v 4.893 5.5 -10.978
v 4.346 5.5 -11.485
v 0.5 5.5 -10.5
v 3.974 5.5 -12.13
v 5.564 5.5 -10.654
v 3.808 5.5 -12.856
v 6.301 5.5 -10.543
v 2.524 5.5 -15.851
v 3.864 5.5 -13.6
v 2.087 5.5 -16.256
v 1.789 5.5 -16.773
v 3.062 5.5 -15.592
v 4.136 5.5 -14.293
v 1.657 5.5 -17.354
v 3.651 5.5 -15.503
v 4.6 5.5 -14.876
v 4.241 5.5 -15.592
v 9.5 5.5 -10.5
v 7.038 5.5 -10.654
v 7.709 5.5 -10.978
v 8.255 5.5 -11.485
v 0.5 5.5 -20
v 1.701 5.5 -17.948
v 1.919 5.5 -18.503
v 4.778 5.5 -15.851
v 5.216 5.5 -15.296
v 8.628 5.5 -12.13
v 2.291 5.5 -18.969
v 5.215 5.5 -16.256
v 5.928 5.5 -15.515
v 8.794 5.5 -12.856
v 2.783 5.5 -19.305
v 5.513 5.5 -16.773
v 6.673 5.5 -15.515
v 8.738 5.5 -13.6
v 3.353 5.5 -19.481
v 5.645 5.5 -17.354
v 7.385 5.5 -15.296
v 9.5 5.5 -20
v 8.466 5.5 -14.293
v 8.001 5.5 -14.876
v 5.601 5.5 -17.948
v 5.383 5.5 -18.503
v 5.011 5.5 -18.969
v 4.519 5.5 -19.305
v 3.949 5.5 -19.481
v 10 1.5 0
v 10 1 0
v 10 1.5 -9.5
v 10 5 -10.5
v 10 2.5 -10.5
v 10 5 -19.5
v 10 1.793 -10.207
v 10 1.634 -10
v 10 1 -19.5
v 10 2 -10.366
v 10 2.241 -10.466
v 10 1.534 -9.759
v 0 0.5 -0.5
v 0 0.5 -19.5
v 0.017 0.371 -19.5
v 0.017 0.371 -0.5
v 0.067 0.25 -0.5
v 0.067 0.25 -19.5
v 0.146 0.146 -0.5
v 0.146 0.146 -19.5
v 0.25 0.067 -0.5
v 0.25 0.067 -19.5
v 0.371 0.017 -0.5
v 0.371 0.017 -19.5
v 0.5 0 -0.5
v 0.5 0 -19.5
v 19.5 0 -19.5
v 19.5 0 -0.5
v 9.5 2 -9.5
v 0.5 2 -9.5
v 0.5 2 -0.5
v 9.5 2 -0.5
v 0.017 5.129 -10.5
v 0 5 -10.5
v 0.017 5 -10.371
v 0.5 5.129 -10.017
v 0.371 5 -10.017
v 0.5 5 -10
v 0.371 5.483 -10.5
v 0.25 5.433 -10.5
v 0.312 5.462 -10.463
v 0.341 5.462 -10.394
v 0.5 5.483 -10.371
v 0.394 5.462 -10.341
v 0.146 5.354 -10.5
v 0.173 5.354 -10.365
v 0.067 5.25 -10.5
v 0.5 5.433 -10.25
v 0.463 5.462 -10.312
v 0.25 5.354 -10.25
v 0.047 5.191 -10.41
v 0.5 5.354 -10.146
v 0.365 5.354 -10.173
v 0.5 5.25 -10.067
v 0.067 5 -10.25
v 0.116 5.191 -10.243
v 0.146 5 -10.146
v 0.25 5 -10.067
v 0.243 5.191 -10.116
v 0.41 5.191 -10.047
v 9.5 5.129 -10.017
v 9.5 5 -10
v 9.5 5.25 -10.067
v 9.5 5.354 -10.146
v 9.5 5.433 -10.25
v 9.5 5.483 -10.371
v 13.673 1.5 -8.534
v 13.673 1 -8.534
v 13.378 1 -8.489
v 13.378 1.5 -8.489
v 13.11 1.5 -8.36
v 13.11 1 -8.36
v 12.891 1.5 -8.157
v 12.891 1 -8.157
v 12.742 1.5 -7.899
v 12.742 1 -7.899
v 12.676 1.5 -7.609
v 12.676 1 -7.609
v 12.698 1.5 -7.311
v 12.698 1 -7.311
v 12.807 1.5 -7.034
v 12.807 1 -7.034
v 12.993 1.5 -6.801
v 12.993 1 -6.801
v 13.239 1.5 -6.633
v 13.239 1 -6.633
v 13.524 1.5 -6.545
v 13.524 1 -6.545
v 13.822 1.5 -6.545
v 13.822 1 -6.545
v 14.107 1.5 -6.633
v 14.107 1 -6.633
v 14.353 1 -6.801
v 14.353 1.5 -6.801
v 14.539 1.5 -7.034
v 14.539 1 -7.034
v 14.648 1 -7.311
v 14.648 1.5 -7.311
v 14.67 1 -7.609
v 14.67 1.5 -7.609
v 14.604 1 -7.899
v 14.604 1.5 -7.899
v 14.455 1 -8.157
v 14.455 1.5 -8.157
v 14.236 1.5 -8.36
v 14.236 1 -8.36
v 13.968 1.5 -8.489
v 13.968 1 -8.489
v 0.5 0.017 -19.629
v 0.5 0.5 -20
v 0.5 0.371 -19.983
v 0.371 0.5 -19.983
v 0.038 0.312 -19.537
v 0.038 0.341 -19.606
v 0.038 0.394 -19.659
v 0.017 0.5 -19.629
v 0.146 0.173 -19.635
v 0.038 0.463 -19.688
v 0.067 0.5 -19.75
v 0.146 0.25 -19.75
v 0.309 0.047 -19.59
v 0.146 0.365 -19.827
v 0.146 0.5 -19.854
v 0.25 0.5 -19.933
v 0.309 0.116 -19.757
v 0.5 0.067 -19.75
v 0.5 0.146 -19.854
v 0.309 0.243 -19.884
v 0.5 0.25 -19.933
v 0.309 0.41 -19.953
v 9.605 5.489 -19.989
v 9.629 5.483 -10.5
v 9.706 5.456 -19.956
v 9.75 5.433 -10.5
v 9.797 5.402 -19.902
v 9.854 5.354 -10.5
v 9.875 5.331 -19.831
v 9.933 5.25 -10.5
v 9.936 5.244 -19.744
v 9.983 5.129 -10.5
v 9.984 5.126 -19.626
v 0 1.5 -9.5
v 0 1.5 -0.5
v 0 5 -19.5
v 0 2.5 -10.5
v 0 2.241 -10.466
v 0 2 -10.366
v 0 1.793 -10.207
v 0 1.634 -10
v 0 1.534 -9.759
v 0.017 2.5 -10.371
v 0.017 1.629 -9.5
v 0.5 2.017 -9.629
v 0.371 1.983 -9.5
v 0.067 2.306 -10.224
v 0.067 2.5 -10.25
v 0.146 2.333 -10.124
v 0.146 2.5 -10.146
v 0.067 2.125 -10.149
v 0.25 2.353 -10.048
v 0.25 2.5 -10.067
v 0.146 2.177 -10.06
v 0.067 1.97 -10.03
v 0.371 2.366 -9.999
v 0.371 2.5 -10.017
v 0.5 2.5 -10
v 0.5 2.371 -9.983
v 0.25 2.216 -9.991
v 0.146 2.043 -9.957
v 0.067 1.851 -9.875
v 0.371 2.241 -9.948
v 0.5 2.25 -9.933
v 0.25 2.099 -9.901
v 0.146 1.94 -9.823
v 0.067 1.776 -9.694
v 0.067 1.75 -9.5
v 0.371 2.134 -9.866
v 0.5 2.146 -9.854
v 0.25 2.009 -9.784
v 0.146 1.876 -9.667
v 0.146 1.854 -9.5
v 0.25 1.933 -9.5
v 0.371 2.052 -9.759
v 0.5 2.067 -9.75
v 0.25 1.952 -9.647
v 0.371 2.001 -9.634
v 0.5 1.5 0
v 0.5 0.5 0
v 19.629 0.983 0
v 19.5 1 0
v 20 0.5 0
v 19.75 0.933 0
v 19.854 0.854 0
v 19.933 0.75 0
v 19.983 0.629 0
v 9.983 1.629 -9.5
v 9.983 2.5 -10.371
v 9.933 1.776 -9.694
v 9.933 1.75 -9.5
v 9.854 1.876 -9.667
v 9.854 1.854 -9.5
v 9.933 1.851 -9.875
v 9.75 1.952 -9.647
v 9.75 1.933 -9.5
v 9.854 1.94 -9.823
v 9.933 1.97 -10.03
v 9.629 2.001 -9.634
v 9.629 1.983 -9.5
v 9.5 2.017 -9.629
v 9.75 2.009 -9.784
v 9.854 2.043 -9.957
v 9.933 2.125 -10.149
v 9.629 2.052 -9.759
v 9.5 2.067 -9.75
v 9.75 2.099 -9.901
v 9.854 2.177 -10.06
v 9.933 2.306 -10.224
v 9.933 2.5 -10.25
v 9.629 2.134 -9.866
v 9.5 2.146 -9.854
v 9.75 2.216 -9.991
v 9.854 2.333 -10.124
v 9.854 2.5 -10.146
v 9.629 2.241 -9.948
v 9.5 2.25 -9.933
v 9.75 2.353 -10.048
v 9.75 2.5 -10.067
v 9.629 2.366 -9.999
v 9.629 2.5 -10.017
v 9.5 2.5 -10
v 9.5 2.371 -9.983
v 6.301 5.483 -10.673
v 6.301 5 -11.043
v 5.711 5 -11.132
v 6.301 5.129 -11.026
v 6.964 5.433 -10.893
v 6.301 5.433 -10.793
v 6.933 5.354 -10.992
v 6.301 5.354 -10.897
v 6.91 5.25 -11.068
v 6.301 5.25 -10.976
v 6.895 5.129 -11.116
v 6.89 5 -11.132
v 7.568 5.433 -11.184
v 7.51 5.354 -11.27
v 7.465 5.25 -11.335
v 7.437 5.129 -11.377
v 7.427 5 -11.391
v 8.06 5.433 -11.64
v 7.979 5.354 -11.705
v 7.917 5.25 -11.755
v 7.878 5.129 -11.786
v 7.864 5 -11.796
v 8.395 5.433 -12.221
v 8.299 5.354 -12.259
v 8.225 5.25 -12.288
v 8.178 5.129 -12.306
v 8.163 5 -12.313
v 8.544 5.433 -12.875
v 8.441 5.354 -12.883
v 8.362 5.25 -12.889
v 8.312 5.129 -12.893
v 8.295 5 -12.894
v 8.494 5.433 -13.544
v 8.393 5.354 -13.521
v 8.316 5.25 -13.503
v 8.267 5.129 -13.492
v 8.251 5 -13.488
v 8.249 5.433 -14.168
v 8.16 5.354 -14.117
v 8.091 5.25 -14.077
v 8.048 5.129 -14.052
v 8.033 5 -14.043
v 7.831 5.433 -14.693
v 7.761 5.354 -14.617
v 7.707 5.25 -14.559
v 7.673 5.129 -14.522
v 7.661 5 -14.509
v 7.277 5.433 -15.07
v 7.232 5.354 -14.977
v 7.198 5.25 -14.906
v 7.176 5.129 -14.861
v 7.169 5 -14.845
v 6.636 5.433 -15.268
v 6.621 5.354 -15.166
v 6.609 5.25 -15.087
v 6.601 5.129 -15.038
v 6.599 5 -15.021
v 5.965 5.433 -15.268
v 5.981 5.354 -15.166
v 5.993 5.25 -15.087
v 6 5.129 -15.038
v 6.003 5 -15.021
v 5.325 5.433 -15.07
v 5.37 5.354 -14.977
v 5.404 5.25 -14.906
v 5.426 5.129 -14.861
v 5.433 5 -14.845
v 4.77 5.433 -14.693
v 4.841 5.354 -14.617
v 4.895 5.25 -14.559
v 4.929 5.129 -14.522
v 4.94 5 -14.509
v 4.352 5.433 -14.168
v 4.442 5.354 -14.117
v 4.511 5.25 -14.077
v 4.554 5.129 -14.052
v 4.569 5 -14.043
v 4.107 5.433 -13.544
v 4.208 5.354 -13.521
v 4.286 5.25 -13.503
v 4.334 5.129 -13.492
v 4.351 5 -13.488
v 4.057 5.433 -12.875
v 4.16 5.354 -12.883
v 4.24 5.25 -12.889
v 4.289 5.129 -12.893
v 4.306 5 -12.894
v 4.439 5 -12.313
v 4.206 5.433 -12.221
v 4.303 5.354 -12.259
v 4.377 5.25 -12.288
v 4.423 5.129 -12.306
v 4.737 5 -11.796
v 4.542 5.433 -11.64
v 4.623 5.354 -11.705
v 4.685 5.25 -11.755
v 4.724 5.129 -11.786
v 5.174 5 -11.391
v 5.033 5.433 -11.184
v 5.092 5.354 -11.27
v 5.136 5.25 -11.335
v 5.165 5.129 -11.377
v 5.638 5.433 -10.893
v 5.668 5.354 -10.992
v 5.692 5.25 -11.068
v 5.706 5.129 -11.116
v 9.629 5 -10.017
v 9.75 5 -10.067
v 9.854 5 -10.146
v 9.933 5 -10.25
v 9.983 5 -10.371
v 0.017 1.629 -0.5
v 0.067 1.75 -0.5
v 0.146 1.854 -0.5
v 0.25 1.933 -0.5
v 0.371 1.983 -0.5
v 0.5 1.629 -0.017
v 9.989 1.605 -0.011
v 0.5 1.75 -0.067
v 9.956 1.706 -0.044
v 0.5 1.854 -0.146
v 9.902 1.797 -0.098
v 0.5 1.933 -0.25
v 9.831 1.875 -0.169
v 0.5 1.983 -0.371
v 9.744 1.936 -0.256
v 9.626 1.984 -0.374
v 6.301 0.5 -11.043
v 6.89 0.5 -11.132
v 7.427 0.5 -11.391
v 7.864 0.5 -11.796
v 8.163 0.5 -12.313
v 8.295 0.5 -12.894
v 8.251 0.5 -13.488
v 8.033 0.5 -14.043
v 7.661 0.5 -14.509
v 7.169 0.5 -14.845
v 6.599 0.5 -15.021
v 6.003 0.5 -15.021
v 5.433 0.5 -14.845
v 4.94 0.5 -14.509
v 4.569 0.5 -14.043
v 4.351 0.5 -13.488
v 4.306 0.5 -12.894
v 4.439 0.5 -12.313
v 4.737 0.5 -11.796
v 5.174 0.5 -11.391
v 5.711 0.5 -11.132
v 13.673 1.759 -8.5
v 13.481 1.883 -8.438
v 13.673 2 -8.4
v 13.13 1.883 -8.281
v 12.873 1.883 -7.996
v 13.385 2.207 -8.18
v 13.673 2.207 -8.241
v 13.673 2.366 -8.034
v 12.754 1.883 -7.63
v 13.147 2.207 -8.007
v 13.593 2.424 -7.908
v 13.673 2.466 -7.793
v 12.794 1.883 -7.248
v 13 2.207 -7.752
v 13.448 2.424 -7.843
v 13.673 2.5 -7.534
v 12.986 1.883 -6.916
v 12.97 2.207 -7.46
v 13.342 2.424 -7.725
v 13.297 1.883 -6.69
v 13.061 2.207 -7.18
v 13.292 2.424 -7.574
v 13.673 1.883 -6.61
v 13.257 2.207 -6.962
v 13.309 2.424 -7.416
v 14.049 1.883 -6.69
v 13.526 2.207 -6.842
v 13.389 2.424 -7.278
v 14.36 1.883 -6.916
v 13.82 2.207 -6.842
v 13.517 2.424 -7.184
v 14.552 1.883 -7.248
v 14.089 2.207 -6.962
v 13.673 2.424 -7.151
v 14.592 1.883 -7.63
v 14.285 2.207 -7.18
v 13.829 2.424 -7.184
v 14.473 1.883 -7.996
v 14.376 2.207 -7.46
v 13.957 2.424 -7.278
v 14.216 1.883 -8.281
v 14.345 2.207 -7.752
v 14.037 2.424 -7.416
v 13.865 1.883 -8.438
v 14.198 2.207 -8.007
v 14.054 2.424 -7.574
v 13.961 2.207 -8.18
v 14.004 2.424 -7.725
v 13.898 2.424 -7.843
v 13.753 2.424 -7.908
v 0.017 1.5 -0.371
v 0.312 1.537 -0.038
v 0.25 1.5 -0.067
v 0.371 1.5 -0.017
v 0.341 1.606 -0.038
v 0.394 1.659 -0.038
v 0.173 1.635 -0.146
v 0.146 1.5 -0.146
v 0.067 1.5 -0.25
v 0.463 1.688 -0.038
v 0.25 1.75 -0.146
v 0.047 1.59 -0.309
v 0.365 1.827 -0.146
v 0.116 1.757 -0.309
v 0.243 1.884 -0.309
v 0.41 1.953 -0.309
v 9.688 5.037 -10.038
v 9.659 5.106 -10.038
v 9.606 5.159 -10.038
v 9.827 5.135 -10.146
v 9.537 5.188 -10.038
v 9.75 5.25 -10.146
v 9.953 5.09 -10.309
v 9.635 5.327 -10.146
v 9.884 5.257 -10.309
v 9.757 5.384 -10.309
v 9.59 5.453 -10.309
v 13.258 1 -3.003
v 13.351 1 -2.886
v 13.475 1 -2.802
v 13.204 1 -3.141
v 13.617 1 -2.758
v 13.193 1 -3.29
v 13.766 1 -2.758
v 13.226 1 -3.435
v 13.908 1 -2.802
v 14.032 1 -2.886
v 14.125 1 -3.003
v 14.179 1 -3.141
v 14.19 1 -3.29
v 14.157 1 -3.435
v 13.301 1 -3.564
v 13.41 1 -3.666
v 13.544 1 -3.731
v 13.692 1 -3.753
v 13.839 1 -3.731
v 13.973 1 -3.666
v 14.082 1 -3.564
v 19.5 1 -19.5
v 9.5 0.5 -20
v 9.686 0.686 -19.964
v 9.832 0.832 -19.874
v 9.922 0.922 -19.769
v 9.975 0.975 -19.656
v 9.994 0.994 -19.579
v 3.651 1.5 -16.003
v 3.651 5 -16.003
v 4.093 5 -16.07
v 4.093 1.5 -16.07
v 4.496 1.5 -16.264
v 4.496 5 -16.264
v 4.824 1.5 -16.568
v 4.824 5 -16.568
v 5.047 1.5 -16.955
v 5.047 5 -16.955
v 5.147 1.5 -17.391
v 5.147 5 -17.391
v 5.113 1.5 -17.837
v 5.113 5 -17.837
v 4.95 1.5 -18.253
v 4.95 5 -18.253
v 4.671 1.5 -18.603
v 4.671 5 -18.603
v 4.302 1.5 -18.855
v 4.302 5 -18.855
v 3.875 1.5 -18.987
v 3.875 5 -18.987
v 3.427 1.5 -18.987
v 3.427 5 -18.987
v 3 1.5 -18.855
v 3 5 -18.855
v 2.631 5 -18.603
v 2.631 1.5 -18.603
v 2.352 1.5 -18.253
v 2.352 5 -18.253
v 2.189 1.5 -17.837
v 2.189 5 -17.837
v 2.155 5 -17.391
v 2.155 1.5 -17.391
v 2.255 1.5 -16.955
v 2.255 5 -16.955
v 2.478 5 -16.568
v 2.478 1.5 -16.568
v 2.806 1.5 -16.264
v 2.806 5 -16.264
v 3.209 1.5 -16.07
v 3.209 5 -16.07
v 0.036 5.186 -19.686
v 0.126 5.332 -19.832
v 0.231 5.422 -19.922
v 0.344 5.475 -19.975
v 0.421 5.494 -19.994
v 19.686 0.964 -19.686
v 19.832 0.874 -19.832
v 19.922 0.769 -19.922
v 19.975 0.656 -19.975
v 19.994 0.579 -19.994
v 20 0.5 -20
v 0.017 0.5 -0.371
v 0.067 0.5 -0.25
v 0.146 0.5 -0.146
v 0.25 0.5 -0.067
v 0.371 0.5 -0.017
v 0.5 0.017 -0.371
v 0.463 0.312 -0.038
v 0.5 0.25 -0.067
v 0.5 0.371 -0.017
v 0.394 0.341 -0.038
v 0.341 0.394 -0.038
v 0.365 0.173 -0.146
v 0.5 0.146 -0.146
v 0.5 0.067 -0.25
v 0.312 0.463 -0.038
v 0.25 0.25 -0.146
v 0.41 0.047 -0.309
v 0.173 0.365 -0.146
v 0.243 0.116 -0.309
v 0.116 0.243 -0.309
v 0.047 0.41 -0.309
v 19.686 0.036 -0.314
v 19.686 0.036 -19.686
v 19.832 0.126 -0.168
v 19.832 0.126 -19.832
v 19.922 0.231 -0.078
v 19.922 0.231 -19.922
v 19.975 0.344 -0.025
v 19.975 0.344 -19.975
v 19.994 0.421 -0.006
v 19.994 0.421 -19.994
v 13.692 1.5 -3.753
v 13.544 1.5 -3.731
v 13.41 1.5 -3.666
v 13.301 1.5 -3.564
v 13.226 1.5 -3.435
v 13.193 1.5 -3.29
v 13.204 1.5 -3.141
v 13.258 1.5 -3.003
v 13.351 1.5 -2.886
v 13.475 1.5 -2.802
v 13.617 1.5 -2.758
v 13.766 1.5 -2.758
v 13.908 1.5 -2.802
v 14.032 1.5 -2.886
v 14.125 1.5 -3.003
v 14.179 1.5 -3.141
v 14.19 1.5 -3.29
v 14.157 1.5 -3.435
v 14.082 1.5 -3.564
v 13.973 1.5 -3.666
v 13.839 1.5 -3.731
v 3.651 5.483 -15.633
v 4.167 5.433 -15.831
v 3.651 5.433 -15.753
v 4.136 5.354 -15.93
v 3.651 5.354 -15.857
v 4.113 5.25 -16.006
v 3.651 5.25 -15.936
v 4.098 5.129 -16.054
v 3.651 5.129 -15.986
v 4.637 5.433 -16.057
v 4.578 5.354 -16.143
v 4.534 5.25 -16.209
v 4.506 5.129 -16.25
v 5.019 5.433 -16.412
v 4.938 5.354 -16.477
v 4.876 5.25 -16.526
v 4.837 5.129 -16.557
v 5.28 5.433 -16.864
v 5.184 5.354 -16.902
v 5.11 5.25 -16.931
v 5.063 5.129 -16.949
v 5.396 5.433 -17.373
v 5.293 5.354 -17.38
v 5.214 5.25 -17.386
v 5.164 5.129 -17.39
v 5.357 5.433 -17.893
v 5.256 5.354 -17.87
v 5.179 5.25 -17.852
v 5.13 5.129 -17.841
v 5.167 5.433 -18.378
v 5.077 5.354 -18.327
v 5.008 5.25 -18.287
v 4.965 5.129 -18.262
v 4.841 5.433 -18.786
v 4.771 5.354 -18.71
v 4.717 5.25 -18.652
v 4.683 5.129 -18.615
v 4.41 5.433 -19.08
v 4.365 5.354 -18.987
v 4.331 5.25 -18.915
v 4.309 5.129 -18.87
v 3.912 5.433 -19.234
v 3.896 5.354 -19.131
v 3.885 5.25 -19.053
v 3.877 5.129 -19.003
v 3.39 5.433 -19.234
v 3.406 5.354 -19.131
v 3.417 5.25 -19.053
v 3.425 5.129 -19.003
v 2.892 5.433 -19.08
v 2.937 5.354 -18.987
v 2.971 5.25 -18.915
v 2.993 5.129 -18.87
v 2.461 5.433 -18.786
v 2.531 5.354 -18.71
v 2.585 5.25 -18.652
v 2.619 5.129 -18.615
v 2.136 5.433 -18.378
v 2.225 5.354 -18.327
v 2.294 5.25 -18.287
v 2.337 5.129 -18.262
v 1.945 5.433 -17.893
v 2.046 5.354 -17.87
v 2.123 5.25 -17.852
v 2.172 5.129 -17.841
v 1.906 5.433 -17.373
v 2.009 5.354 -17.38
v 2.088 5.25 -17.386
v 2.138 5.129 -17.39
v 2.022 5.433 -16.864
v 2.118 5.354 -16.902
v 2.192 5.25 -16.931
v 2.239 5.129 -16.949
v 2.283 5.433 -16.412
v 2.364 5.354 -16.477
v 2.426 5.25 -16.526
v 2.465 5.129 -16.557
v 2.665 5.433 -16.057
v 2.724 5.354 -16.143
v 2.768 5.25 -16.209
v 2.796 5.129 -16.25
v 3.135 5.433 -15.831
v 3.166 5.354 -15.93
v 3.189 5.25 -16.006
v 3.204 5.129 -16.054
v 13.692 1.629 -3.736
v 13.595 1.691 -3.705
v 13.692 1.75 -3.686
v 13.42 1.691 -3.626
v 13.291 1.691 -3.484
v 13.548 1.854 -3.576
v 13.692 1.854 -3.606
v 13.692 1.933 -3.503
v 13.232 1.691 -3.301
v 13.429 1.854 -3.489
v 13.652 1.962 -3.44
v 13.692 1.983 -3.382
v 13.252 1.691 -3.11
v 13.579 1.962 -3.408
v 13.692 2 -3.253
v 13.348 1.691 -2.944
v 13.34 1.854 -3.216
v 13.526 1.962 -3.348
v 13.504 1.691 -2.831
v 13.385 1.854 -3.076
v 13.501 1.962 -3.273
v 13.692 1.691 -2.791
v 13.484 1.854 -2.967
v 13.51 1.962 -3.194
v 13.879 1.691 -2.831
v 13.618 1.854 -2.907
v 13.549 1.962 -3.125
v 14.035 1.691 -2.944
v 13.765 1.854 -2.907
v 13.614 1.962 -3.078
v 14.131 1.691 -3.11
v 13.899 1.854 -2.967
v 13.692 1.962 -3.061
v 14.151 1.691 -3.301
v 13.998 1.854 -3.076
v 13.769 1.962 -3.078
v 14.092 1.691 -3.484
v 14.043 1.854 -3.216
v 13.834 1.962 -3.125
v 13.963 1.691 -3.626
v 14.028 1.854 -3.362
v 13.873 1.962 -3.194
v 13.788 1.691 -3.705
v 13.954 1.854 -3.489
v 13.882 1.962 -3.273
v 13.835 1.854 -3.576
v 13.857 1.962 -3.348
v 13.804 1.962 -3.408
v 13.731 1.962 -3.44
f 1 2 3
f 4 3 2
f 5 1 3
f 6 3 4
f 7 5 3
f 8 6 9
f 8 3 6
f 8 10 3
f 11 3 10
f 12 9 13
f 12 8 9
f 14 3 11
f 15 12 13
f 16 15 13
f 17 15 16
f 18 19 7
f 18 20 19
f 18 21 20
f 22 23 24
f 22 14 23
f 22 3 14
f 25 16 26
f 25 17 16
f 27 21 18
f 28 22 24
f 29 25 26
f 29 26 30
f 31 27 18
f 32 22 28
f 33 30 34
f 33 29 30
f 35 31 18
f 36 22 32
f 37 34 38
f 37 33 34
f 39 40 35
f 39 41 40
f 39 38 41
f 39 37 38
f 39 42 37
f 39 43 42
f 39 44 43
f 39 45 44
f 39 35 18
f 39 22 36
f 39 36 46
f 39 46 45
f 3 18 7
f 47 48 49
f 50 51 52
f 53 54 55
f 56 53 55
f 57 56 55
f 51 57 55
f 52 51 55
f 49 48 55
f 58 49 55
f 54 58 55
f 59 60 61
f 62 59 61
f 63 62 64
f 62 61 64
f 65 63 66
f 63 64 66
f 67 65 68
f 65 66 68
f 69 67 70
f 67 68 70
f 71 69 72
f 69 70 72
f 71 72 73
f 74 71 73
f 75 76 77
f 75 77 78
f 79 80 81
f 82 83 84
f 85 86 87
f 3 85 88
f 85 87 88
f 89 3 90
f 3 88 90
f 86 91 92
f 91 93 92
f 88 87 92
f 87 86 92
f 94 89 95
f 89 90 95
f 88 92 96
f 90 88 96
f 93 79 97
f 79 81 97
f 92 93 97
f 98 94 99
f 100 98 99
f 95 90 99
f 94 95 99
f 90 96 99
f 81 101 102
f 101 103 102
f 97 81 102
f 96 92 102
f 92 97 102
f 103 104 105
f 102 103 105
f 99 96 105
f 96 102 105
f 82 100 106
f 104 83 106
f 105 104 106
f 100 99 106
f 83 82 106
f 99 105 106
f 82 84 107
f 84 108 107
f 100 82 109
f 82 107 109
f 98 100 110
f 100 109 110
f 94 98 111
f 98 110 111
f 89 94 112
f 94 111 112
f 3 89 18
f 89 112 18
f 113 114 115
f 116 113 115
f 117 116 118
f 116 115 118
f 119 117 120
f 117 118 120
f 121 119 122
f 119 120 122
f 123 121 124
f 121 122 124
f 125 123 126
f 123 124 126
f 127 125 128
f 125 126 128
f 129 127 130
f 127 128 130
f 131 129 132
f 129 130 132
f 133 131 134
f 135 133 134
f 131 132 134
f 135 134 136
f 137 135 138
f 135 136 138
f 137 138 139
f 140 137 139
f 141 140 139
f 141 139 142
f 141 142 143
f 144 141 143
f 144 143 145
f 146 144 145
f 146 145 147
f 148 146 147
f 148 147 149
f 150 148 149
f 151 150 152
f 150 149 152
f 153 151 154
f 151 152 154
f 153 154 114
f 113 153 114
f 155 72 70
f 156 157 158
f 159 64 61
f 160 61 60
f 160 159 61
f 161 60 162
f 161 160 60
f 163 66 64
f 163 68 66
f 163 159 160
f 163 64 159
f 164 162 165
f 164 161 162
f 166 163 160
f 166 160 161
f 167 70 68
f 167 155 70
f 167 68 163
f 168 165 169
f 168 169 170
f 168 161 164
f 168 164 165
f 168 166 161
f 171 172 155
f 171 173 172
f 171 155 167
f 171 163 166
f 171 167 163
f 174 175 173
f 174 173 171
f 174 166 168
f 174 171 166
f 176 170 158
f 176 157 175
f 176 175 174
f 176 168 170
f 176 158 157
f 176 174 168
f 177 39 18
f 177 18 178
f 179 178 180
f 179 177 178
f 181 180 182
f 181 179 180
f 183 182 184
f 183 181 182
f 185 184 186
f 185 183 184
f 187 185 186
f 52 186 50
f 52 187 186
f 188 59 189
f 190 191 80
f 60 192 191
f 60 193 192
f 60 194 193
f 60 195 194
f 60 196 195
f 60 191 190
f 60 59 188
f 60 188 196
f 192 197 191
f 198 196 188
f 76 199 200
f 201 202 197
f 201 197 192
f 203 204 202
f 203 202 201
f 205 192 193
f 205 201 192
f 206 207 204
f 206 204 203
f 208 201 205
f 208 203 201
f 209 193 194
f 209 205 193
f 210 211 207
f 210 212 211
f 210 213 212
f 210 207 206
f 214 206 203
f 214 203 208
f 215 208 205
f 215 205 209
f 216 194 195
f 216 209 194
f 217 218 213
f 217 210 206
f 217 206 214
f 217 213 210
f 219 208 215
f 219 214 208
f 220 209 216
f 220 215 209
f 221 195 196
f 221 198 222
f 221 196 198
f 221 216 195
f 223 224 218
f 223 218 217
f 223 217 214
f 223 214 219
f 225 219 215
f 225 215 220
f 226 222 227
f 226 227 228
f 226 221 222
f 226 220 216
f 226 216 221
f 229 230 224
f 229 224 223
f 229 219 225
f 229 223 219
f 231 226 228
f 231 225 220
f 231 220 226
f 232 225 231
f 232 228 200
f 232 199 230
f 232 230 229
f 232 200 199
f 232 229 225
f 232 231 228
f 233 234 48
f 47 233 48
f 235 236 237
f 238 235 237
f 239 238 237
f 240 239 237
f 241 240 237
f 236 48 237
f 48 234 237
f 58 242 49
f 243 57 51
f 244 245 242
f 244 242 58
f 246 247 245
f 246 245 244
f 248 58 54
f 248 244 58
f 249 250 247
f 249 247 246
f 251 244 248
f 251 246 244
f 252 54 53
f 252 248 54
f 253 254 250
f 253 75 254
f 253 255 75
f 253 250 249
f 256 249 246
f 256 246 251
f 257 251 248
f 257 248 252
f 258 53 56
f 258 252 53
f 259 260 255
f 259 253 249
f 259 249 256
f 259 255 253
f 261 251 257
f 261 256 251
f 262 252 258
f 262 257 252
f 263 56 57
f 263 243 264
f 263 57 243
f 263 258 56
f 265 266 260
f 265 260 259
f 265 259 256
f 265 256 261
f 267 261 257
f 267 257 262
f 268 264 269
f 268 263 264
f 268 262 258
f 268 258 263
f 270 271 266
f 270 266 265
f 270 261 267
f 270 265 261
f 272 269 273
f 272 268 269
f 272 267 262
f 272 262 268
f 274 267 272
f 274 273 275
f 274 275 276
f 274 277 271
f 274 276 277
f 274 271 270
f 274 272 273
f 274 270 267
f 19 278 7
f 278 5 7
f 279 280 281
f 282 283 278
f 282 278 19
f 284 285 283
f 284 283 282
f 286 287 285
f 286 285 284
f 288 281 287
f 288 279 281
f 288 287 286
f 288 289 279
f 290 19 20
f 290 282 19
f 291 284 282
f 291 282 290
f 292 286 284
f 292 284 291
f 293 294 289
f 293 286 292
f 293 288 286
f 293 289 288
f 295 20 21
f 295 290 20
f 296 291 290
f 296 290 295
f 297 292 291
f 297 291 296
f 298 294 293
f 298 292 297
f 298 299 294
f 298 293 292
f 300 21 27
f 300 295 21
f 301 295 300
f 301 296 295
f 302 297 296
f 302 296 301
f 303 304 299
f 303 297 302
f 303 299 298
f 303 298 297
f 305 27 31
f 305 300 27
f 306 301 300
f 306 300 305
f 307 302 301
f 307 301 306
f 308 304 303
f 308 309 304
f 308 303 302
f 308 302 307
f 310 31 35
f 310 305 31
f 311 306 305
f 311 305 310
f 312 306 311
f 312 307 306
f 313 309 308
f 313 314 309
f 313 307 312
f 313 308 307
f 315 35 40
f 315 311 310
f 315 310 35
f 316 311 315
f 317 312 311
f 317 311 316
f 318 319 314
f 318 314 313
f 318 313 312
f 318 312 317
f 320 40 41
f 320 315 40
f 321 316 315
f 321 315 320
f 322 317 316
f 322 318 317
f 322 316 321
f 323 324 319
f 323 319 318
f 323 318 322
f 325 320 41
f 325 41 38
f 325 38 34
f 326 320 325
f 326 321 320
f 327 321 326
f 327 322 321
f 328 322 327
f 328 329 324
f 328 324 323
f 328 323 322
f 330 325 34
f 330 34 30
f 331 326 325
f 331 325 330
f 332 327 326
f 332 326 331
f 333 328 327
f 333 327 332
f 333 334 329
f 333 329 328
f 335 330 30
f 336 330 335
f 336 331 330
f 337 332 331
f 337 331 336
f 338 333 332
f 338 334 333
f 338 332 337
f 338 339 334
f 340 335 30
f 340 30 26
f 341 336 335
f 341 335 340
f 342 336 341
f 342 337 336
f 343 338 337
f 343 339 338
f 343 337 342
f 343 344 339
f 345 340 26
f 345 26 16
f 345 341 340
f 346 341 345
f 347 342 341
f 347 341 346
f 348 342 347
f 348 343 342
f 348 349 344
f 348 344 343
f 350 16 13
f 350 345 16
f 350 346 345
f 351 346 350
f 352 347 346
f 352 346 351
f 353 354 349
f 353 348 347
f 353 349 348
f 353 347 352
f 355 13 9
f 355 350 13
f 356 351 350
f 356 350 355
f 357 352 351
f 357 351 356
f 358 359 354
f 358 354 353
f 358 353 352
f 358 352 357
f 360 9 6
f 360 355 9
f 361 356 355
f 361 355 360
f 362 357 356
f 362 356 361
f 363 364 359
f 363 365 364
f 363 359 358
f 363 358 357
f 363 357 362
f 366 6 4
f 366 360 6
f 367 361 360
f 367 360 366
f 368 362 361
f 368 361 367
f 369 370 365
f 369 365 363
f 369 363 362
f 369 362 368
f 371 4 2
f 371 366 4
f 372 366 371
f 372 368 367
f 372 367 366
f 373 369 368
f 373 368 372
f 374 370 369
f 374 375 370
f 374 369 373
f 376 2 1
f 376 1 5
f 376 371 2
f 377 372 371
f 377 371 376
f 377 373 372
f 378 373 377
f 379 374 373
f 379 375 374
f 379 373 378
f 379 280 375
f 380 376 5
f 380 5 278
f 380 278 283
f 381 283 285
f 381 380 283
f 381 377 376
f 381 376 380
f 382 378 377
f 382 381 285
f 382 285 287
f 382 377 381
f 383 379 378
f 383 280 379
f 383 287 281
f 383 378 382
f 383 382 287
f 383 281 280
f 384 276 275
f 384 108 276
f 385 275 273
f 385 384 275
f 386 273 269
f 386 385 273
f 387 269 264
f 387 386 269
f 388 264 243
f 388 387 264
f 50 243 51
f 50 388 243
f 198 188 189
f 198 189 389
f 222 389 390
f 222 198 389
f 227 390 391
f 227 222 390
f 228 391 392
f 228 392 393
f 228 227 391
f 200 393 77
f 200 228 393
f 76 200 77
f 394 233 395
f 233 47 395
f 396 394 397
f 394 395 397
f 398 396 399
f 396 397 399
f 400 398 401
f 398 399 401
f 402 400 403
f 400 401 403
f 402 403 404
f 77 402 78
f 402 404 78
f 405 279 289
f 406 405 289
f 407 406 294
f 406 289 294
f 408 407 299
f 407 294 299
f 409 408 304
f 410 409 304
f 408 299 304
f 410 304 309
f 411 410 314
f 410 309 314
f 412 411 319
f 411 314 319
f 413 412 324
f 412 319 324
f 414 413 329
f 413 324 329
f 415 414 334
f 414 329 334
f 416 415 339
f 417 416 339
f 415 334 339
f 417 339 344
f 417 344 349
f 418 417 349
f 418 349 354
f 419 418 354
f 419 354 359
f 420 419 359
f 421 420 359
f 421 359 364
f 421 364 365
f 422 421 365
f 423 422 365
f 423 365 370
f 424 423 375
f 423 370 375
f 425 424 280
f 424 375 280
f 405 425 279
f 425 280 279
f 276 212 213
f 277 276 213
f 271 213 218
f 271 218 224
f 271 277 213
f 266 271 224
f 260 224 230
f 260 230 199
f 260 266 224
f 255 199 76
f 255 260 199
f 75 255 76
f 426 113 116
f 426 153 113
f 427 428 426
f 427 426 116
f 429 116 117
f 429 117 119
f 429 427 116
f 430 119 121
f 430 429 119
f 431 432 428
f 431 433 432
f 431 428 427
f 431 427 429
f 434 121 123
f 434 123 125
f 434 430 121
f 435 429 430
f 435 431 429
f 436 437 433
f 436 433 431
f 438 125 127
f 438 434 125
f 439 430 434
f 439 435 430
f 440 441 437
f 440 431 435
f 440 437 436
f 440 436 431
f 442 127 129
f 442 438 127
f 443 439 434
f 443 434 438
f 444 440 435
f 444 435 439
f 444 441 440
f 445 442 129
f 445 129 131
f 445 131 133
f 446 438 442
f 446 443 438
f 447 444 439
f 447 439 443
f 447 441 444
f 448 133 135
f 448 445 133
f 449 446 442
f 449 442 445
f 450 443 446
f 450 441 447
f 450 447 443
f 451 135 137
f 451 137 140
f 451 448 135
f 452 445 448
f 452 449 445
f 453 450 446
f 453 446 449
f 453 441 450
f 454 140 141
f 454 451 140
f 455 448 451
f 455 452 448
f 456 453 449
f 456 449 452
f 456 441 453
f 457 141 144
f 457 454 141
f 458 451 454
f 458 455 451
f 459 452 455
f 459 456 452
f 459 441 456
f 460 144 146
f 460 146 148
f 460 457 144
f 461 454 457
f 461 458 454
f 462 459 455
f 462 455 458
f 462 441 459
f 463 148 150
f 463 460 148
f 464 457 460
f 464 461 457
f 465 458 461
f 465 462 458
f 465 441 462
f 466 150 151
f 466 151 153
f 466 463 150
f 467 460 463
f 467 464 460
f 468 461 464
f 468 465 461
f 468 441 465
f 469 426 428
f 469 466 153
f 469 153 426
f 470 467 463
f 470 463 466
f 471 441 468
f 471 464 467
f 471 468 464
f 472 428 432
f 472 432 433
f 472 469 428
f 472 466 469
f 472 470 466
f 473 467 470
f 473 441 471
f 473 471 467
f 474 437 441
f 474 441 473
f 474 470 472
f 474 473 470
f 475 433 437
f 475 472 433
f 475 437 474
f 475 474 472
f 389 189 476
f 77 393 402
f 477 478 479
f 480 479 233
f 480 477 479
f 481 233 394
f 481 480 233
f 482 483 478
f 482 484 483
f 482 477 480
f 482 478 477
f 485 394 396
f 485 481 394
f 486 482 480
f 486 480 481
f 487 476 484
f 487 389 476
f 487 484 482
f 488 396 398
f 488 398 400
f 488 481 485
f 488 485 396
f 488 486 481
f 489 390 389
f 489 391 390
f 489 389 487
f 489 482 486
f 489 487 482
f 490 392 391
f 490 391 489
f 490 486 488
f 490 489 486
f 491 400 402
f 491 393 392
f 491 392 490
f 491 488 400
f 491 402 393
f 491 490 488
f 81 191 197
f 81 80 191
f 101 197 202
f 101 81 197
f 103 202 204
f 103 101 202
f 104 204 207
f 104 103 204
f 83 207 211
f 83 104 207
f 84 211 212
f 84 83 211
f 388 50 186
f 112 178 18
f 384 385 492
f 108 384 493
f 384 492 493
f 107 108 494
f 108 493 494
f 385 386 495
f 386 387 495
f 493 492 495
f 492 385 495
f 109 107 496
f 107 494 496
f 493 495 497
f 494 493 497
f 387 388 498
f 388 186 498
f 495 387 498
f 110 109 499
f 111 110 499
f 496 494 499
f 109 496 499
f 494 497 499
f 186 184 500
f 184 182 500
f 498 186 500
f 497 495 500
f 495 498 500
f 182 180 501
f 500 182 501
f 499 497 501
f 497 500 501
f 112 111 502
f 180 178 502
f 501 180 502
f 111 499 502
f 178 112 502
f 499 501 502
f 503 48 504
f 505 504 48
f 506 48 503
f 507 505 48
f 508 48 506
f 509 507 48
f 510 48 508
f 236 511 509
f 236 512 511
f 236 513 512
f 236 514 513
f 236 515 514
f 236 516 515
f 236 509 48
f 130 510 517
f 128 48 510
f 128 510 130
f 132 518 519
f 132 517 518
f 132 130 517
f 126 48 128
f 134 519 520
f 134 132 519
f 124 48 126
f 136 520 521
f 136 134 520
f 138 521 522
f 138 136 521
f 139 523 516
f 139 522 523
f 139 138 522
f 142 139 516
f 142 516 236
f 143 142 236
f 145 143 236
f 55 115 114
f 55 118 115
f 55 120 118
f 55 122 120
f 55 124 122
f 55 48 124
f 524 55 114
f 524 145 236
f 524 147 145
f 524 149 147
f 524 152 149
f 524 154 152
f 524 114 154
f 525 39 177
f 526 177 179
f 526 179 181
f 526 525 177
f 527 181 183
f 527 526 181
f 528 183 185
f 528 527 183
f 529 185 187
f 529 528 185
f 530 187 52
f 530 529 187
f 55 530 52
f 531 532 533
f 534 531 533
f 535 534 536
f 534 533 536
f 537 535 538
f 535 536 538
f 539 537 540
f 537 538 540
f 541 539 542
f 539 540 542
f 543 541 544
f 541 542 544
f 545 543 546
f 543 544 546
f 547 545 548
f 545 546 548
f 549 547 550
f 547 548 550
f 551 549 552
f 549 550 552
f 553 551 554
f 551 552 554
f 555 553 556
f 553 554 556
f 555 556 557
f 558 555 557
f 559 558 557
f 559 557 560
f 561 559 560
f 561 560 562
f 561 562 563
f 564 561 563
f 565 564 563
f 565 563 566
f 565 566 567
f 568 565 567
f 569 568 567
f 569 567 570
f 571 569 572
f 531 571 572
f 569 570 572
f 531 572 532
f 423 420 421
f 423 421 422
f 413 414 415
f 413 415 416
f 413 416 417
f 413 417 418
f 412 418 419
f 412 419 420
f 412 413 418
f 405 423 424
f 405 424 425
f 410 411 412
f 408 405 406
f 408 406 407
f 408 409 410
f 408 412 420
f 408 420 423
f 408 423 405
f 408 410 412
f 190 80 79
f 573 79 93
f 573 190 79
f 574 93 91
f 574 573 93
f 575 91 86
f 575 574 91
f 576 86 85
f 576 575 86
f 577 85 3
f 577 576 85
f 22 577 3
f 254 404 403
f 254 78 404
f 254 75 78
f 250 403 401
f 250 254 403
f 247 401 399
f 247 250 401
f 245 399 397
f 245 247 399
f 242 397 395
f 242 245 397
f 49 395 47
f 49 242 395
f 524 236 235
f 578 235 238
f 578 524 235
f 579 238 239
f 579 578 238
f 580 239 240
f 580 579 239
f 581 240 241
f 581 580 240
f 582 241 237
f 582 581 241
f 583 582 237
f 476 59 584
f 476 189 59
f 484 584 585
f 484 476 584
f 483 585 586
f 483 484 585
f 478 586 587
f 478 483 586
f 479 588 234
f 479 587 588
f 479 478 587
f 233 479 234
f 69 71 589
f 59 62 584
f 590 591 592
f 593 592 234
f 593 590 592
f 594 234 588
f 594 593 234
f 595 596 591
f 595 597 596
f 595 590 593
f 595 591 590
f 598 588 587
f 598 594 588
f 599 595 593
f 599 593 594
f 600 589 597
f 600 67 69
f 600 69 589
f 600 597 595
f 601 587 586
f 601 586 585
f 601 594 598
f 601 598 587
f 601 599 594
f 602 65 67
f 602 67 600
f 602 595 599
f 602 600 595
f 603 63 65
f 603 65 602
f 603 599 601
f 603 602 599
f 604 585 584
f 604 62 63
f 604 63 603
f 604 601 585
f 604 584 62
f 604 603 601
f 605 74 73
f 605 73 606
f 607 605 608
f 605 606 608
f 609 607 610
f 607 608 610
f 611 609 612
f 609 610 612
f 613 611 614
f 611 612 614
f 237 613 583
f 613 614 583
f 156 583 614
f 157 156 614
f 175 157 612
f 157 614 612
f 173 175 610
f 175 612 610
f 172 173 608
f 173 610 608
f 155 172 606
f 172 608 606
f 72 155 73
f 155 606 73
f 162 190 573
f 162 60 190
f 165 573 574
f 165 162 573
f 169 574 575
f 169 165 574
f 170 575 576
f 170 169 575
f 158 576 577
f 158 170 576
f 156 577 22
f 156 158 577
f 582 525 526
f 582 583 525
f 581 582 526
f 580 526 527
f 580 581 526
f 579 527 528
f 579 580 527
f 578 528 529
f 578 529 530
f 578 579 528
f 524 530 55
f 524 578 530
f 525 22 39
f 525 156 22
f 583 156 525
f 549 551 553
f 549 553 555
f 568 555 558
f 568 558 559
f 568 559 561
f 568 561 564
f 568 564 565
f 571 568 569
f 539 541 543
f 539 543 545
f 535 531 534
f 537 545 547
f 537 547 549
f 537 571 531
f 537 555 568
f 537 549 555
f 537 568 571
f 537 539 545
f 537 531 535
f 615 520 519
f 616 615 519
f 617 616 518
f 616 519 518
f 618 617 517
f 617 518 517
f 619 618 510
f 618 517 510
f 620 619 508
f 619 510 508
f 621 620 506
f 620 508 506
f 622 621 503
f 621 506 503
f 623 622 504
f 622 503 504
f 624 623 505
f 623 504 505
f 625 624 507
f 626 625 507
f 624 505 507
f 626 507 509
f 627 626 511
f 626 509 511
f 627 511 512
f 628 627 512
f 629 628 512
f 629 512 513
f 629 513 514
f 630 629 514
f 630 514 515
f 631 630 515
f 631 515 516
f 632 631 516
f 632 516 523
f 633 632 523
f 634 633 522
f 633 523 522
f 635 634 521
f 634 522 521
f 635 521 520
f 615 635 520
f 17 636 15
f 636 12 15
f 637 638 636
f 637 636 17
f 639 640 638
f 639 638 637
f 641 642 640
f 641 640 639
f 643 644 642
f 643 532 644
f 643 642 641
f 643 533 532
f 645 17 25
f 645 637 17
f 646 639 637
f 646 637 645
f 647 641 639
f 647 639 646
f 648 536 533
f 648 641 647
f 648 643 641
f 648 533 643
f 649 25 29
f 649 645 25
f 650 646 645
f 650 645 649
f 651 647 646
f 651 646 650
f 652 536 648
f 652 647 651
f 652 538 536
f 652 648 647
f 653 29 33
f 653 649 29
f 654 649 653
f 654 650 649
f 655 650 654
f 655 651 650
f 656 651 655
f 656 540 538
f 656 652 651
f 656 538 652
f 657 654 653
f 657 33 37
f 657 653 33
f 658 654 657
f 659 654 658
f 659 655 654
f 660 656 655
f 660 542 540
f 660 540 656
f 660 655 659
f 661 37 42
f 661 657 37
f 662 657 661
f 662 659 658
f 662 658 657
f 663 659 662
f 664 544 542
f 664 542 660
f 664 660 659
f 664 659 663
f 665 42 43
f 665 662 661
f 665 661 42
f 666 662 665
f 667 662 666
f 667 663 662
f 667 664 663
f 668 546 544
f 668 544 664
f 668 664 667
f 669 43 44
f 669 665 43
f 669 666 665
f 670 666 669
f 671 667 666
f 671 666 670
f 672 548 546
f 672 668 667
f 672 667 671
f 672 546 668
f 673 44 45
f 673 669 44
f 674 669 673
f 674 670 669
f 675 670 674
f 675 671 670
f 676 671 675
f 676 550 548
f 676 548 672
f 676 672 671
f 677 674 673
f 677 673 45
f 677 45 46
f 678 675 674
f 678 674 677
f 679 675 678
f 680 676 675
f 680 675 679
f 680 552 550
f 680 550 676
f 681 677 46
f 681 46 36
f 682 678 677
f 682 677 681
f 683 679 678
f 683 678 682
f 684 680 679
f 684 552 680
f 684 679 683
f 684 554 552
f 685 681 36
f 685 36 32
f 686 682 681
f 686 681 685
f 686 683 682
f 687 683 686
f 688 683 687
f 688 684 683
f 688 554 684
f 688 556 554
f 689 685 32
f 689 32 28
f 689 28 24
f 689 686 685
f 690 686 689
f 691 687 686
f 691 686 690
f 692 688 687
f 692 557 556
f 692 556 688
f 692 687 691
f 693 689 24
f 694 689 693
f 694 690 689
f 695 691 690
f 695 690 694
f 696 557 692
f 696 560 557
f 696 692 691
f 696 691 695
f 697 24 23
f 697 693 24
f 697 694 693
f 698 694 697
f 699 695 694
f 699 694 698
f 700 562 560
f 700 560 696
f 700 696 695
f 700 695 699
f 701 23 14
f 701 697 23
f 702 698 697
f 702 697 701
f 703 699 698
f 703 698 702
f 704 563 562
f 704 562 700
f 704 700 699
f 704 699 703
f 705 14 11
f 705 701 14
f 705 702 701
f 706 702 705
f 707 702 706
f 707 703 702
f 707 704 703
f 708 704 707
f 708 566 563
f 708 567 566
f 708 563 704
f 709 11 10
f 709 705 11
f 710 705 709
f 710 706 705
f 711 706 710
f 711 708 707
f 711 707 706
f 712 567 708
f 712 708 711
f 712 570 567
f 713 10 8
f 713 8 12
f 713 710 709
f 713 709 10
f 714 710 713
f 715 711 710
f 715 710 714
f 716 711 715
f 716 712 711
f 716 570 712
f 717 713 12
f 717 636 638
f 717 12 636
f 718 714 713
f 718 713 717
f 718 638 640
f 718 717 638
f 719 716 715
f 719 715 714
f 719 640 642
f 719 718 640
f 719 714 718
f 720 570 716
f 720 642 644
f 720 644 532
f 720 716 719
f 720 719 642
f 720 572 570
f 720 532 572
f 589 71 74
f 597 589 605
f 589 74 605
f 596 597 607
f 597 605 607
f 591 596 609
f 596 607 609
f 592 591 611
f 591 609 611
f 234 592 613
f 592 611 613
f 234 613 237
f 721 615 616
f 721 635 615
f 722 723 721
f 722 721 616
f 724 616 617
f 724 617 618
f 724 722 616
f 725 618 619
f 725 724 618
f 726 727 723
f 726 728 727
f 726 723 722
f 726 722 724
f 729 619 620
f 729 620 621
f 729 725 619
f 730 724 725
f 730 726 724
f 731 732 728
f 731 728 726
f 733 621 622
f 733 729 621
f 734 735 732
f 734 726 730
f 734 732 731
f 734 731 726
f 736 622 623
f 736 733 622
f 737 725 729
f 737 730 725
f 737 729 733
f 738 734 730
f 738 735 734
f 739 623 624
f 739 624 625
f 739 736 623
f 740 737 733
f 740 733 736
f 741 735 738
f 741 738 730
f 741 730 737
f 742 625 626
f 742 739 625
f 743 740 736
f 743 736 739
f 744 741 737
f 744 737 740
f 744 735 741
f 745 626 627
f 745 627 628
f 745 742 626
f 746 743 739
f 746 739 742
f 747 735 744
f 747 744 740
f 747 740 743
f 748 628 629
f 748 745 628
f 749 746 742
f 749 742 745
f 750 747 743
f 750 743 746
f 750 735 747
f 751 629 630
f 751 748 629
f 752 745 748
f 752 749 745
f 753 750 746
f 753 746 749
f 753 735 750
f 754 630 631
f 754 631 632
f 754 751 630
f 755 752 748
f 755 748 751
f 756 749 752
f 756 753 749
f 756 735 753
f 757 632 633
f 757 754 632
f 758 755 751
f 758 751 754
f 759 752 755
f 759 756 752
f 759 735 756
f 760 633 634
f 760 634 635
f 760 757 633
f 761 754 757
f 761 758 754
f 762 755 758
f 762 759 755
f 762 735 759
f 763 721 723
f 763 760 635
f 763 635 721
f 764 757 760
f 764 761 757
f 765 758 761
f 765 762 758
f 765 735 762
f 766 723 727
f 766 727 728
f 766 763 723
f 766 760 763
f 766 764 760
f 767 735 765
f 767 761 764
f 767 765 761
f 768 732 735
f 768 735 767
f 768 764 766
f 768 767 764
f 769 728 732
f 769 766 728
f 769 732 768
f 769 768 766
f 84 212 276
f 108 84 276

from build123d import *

# Parameters (mm, degrees)
SKETCH1_W           = 10
SKETCH1_H           = 20
BOSS_EXTRUDE1_DEPTH = 2
SKETCH2_W           = 10
SKETCH2_H           = 20
BOSS_EXTRUDE2_DEPTH = 1
SKETCH3_R           = 0.5
BOSS_EXTRUDE3_DEPTH = 1
FILLET1_R           = 0.5
SKETCH4_R           = 1
BOSS_EXTRUDE4_DEPTH = 1.5
FILLET2_R           = 1
SKETCH5_W           = 10
SKETCH5_H           = 10
BOSS_EXTRUDE5_DEPTH = 3.5
SKETCH7_R           = 1.5
CUT_EXTRUDE1_DEPTH  = 4
SKETCH8_R           = 2
CUT_EXTRUDE2_DEPTH  = 5
FILLET3_R           = 0.5


with BuildPart() as part:
    # Sketch1 → Boss-Extrude1 (new body)
    with BuildSketch(Plane(origin=(0, 0, 0), x_dir=(1, 0, 0), z_dir=(0, 1, 0))):
        with Locations((5, 10)):
            Rectangle(SKETCH1_W, SKETCH1_H)
    extrude(amount=BOSS_EXTRUDE1_DEPTH)

    # Sketch2 → Boss-Extrude2 (add)
    with BuildSketch(Plane(origin=(0, 0, 0), x_dir=(1, 0, 0), z_dir=(0, 1, 0))):
        with Locations((15, 10)):
            Rectangle(SKETCH2_W, SKETCH2_H)
    extrude(amount=BOSS_EXTRUDE2_DEPTH)

    # Sketch3 → Boss-Extrude3 (add)
    with BuildSketch(Plane(origin=(0, 1, 0), x_dir=(1, 0, 0), z_dir=(0, 1, 0))):
        with Locations(Location((13.691502903, 3.252748725, 0), (0, 0, 90))):
            Circle(SKETCH3_R)
    extrude(amount=BOSS_EXTRUDE3_DEPTH)

    # Fillet1
    fillet1_edges = [part.edges().sort_by_distance(p)[0] for p in [
        (13.691502903, 2, -2.752748725),
    ]]
    fillet(fillet1_edges, radius=FILLET1_R)

    # Sketch4 → Boss-Extrude4 (add)
    with BuildSketch(Plane(origin=(0, 1, 0), x_dir=(1, 0, 0), z_dir=(0, 1, 0))):
        with Locations(Location((13.672959069, 7.53387034, 0), (0, 0, 90))):
            Circle(SKETCH4_R)
    extrude(amount=BOSS_EXTRUDE4_DEPTH)

    # Fillet2
    fillet2_edges = [part.edges().sort_by_distance(p)[0] for p in [
        (13.672959069, 2.5, -6.53387034),
    ]]
    fillet(fillet2_edges, radius=FILLET2_R)

    # Sketch5 → Boss-Extrude5 (add)
    with BuildSketch(Plane(origin=(0, 2, 0), x_dir=(1, 0, 0), z_dir=(0, 1, 0))):
        with Locations((5, 15)):
            Rectangle(SKETCH5_W, SKETCH5_H)
    extrude(amount=BOSS_EXTRUDE5_DEPTH)

    # Sketch7 → Cut-Extrude1 (cut)
    with BuildSketch(Plane(origin=(0, 5.5, 0), x_dir=(1, 0, 0), z_dir=(0, 1, 0))):
        with Locations(Location((3.651027896, 17.503330669, 0), (0, 0, 270))):
            Circle(SKETCH7_R)
    extrude(amount=-CUT_EXTRUDE1_DEPTH, mode=Mode.SUBTRACT)

    # Sketch8 → Cut-Extrude2 (cut)
    with BuildSketch(Plane(origin=(0, 5.5, 0), x_dir=(1, 0, 0), z_dir=(0, 1, 0))):
        with Locations(Location((6.300805509, 13.043308943, 0), (0, 0, 270))):
            Circle(SKETCH8_R)
    extrude(amount=-CUT_EXTRUDE2_DEPTH, mode=Mode.SUBTRACT)

    # Fillet3
    fillet3_edges = [part.edges().sort_by_distance(p)[0] for p in [
        (0, 2, -5),
        (20, 0, -10),
        (20, 1, -10),
        (10, 0, -20),
        (0, 0, -10),
        (10, 0, 0),
        (0, 1, 0),
        (5, 2, 0),
        (5, 2, -10),
        (10, 2, -5),
        (15, 1, -20),
        (0, 2.75, -20),
        (10, 3.25, -20),
        (10, 5.5, -15),
        (10, 3.75, -10),
        (0, 3.75, -10),
        (0, 5.5, -15),
        (5, 5.5, -10),
        (6.300805509, 5.5, -15.043308943),
        (3.651027896, 5.5, -19.003330669),
    ]]
    fillet(fillet3_edges, radius=FILLET3_R - 0.0001)  # a hair under: the kernel refuses the full size


solid = part.part
